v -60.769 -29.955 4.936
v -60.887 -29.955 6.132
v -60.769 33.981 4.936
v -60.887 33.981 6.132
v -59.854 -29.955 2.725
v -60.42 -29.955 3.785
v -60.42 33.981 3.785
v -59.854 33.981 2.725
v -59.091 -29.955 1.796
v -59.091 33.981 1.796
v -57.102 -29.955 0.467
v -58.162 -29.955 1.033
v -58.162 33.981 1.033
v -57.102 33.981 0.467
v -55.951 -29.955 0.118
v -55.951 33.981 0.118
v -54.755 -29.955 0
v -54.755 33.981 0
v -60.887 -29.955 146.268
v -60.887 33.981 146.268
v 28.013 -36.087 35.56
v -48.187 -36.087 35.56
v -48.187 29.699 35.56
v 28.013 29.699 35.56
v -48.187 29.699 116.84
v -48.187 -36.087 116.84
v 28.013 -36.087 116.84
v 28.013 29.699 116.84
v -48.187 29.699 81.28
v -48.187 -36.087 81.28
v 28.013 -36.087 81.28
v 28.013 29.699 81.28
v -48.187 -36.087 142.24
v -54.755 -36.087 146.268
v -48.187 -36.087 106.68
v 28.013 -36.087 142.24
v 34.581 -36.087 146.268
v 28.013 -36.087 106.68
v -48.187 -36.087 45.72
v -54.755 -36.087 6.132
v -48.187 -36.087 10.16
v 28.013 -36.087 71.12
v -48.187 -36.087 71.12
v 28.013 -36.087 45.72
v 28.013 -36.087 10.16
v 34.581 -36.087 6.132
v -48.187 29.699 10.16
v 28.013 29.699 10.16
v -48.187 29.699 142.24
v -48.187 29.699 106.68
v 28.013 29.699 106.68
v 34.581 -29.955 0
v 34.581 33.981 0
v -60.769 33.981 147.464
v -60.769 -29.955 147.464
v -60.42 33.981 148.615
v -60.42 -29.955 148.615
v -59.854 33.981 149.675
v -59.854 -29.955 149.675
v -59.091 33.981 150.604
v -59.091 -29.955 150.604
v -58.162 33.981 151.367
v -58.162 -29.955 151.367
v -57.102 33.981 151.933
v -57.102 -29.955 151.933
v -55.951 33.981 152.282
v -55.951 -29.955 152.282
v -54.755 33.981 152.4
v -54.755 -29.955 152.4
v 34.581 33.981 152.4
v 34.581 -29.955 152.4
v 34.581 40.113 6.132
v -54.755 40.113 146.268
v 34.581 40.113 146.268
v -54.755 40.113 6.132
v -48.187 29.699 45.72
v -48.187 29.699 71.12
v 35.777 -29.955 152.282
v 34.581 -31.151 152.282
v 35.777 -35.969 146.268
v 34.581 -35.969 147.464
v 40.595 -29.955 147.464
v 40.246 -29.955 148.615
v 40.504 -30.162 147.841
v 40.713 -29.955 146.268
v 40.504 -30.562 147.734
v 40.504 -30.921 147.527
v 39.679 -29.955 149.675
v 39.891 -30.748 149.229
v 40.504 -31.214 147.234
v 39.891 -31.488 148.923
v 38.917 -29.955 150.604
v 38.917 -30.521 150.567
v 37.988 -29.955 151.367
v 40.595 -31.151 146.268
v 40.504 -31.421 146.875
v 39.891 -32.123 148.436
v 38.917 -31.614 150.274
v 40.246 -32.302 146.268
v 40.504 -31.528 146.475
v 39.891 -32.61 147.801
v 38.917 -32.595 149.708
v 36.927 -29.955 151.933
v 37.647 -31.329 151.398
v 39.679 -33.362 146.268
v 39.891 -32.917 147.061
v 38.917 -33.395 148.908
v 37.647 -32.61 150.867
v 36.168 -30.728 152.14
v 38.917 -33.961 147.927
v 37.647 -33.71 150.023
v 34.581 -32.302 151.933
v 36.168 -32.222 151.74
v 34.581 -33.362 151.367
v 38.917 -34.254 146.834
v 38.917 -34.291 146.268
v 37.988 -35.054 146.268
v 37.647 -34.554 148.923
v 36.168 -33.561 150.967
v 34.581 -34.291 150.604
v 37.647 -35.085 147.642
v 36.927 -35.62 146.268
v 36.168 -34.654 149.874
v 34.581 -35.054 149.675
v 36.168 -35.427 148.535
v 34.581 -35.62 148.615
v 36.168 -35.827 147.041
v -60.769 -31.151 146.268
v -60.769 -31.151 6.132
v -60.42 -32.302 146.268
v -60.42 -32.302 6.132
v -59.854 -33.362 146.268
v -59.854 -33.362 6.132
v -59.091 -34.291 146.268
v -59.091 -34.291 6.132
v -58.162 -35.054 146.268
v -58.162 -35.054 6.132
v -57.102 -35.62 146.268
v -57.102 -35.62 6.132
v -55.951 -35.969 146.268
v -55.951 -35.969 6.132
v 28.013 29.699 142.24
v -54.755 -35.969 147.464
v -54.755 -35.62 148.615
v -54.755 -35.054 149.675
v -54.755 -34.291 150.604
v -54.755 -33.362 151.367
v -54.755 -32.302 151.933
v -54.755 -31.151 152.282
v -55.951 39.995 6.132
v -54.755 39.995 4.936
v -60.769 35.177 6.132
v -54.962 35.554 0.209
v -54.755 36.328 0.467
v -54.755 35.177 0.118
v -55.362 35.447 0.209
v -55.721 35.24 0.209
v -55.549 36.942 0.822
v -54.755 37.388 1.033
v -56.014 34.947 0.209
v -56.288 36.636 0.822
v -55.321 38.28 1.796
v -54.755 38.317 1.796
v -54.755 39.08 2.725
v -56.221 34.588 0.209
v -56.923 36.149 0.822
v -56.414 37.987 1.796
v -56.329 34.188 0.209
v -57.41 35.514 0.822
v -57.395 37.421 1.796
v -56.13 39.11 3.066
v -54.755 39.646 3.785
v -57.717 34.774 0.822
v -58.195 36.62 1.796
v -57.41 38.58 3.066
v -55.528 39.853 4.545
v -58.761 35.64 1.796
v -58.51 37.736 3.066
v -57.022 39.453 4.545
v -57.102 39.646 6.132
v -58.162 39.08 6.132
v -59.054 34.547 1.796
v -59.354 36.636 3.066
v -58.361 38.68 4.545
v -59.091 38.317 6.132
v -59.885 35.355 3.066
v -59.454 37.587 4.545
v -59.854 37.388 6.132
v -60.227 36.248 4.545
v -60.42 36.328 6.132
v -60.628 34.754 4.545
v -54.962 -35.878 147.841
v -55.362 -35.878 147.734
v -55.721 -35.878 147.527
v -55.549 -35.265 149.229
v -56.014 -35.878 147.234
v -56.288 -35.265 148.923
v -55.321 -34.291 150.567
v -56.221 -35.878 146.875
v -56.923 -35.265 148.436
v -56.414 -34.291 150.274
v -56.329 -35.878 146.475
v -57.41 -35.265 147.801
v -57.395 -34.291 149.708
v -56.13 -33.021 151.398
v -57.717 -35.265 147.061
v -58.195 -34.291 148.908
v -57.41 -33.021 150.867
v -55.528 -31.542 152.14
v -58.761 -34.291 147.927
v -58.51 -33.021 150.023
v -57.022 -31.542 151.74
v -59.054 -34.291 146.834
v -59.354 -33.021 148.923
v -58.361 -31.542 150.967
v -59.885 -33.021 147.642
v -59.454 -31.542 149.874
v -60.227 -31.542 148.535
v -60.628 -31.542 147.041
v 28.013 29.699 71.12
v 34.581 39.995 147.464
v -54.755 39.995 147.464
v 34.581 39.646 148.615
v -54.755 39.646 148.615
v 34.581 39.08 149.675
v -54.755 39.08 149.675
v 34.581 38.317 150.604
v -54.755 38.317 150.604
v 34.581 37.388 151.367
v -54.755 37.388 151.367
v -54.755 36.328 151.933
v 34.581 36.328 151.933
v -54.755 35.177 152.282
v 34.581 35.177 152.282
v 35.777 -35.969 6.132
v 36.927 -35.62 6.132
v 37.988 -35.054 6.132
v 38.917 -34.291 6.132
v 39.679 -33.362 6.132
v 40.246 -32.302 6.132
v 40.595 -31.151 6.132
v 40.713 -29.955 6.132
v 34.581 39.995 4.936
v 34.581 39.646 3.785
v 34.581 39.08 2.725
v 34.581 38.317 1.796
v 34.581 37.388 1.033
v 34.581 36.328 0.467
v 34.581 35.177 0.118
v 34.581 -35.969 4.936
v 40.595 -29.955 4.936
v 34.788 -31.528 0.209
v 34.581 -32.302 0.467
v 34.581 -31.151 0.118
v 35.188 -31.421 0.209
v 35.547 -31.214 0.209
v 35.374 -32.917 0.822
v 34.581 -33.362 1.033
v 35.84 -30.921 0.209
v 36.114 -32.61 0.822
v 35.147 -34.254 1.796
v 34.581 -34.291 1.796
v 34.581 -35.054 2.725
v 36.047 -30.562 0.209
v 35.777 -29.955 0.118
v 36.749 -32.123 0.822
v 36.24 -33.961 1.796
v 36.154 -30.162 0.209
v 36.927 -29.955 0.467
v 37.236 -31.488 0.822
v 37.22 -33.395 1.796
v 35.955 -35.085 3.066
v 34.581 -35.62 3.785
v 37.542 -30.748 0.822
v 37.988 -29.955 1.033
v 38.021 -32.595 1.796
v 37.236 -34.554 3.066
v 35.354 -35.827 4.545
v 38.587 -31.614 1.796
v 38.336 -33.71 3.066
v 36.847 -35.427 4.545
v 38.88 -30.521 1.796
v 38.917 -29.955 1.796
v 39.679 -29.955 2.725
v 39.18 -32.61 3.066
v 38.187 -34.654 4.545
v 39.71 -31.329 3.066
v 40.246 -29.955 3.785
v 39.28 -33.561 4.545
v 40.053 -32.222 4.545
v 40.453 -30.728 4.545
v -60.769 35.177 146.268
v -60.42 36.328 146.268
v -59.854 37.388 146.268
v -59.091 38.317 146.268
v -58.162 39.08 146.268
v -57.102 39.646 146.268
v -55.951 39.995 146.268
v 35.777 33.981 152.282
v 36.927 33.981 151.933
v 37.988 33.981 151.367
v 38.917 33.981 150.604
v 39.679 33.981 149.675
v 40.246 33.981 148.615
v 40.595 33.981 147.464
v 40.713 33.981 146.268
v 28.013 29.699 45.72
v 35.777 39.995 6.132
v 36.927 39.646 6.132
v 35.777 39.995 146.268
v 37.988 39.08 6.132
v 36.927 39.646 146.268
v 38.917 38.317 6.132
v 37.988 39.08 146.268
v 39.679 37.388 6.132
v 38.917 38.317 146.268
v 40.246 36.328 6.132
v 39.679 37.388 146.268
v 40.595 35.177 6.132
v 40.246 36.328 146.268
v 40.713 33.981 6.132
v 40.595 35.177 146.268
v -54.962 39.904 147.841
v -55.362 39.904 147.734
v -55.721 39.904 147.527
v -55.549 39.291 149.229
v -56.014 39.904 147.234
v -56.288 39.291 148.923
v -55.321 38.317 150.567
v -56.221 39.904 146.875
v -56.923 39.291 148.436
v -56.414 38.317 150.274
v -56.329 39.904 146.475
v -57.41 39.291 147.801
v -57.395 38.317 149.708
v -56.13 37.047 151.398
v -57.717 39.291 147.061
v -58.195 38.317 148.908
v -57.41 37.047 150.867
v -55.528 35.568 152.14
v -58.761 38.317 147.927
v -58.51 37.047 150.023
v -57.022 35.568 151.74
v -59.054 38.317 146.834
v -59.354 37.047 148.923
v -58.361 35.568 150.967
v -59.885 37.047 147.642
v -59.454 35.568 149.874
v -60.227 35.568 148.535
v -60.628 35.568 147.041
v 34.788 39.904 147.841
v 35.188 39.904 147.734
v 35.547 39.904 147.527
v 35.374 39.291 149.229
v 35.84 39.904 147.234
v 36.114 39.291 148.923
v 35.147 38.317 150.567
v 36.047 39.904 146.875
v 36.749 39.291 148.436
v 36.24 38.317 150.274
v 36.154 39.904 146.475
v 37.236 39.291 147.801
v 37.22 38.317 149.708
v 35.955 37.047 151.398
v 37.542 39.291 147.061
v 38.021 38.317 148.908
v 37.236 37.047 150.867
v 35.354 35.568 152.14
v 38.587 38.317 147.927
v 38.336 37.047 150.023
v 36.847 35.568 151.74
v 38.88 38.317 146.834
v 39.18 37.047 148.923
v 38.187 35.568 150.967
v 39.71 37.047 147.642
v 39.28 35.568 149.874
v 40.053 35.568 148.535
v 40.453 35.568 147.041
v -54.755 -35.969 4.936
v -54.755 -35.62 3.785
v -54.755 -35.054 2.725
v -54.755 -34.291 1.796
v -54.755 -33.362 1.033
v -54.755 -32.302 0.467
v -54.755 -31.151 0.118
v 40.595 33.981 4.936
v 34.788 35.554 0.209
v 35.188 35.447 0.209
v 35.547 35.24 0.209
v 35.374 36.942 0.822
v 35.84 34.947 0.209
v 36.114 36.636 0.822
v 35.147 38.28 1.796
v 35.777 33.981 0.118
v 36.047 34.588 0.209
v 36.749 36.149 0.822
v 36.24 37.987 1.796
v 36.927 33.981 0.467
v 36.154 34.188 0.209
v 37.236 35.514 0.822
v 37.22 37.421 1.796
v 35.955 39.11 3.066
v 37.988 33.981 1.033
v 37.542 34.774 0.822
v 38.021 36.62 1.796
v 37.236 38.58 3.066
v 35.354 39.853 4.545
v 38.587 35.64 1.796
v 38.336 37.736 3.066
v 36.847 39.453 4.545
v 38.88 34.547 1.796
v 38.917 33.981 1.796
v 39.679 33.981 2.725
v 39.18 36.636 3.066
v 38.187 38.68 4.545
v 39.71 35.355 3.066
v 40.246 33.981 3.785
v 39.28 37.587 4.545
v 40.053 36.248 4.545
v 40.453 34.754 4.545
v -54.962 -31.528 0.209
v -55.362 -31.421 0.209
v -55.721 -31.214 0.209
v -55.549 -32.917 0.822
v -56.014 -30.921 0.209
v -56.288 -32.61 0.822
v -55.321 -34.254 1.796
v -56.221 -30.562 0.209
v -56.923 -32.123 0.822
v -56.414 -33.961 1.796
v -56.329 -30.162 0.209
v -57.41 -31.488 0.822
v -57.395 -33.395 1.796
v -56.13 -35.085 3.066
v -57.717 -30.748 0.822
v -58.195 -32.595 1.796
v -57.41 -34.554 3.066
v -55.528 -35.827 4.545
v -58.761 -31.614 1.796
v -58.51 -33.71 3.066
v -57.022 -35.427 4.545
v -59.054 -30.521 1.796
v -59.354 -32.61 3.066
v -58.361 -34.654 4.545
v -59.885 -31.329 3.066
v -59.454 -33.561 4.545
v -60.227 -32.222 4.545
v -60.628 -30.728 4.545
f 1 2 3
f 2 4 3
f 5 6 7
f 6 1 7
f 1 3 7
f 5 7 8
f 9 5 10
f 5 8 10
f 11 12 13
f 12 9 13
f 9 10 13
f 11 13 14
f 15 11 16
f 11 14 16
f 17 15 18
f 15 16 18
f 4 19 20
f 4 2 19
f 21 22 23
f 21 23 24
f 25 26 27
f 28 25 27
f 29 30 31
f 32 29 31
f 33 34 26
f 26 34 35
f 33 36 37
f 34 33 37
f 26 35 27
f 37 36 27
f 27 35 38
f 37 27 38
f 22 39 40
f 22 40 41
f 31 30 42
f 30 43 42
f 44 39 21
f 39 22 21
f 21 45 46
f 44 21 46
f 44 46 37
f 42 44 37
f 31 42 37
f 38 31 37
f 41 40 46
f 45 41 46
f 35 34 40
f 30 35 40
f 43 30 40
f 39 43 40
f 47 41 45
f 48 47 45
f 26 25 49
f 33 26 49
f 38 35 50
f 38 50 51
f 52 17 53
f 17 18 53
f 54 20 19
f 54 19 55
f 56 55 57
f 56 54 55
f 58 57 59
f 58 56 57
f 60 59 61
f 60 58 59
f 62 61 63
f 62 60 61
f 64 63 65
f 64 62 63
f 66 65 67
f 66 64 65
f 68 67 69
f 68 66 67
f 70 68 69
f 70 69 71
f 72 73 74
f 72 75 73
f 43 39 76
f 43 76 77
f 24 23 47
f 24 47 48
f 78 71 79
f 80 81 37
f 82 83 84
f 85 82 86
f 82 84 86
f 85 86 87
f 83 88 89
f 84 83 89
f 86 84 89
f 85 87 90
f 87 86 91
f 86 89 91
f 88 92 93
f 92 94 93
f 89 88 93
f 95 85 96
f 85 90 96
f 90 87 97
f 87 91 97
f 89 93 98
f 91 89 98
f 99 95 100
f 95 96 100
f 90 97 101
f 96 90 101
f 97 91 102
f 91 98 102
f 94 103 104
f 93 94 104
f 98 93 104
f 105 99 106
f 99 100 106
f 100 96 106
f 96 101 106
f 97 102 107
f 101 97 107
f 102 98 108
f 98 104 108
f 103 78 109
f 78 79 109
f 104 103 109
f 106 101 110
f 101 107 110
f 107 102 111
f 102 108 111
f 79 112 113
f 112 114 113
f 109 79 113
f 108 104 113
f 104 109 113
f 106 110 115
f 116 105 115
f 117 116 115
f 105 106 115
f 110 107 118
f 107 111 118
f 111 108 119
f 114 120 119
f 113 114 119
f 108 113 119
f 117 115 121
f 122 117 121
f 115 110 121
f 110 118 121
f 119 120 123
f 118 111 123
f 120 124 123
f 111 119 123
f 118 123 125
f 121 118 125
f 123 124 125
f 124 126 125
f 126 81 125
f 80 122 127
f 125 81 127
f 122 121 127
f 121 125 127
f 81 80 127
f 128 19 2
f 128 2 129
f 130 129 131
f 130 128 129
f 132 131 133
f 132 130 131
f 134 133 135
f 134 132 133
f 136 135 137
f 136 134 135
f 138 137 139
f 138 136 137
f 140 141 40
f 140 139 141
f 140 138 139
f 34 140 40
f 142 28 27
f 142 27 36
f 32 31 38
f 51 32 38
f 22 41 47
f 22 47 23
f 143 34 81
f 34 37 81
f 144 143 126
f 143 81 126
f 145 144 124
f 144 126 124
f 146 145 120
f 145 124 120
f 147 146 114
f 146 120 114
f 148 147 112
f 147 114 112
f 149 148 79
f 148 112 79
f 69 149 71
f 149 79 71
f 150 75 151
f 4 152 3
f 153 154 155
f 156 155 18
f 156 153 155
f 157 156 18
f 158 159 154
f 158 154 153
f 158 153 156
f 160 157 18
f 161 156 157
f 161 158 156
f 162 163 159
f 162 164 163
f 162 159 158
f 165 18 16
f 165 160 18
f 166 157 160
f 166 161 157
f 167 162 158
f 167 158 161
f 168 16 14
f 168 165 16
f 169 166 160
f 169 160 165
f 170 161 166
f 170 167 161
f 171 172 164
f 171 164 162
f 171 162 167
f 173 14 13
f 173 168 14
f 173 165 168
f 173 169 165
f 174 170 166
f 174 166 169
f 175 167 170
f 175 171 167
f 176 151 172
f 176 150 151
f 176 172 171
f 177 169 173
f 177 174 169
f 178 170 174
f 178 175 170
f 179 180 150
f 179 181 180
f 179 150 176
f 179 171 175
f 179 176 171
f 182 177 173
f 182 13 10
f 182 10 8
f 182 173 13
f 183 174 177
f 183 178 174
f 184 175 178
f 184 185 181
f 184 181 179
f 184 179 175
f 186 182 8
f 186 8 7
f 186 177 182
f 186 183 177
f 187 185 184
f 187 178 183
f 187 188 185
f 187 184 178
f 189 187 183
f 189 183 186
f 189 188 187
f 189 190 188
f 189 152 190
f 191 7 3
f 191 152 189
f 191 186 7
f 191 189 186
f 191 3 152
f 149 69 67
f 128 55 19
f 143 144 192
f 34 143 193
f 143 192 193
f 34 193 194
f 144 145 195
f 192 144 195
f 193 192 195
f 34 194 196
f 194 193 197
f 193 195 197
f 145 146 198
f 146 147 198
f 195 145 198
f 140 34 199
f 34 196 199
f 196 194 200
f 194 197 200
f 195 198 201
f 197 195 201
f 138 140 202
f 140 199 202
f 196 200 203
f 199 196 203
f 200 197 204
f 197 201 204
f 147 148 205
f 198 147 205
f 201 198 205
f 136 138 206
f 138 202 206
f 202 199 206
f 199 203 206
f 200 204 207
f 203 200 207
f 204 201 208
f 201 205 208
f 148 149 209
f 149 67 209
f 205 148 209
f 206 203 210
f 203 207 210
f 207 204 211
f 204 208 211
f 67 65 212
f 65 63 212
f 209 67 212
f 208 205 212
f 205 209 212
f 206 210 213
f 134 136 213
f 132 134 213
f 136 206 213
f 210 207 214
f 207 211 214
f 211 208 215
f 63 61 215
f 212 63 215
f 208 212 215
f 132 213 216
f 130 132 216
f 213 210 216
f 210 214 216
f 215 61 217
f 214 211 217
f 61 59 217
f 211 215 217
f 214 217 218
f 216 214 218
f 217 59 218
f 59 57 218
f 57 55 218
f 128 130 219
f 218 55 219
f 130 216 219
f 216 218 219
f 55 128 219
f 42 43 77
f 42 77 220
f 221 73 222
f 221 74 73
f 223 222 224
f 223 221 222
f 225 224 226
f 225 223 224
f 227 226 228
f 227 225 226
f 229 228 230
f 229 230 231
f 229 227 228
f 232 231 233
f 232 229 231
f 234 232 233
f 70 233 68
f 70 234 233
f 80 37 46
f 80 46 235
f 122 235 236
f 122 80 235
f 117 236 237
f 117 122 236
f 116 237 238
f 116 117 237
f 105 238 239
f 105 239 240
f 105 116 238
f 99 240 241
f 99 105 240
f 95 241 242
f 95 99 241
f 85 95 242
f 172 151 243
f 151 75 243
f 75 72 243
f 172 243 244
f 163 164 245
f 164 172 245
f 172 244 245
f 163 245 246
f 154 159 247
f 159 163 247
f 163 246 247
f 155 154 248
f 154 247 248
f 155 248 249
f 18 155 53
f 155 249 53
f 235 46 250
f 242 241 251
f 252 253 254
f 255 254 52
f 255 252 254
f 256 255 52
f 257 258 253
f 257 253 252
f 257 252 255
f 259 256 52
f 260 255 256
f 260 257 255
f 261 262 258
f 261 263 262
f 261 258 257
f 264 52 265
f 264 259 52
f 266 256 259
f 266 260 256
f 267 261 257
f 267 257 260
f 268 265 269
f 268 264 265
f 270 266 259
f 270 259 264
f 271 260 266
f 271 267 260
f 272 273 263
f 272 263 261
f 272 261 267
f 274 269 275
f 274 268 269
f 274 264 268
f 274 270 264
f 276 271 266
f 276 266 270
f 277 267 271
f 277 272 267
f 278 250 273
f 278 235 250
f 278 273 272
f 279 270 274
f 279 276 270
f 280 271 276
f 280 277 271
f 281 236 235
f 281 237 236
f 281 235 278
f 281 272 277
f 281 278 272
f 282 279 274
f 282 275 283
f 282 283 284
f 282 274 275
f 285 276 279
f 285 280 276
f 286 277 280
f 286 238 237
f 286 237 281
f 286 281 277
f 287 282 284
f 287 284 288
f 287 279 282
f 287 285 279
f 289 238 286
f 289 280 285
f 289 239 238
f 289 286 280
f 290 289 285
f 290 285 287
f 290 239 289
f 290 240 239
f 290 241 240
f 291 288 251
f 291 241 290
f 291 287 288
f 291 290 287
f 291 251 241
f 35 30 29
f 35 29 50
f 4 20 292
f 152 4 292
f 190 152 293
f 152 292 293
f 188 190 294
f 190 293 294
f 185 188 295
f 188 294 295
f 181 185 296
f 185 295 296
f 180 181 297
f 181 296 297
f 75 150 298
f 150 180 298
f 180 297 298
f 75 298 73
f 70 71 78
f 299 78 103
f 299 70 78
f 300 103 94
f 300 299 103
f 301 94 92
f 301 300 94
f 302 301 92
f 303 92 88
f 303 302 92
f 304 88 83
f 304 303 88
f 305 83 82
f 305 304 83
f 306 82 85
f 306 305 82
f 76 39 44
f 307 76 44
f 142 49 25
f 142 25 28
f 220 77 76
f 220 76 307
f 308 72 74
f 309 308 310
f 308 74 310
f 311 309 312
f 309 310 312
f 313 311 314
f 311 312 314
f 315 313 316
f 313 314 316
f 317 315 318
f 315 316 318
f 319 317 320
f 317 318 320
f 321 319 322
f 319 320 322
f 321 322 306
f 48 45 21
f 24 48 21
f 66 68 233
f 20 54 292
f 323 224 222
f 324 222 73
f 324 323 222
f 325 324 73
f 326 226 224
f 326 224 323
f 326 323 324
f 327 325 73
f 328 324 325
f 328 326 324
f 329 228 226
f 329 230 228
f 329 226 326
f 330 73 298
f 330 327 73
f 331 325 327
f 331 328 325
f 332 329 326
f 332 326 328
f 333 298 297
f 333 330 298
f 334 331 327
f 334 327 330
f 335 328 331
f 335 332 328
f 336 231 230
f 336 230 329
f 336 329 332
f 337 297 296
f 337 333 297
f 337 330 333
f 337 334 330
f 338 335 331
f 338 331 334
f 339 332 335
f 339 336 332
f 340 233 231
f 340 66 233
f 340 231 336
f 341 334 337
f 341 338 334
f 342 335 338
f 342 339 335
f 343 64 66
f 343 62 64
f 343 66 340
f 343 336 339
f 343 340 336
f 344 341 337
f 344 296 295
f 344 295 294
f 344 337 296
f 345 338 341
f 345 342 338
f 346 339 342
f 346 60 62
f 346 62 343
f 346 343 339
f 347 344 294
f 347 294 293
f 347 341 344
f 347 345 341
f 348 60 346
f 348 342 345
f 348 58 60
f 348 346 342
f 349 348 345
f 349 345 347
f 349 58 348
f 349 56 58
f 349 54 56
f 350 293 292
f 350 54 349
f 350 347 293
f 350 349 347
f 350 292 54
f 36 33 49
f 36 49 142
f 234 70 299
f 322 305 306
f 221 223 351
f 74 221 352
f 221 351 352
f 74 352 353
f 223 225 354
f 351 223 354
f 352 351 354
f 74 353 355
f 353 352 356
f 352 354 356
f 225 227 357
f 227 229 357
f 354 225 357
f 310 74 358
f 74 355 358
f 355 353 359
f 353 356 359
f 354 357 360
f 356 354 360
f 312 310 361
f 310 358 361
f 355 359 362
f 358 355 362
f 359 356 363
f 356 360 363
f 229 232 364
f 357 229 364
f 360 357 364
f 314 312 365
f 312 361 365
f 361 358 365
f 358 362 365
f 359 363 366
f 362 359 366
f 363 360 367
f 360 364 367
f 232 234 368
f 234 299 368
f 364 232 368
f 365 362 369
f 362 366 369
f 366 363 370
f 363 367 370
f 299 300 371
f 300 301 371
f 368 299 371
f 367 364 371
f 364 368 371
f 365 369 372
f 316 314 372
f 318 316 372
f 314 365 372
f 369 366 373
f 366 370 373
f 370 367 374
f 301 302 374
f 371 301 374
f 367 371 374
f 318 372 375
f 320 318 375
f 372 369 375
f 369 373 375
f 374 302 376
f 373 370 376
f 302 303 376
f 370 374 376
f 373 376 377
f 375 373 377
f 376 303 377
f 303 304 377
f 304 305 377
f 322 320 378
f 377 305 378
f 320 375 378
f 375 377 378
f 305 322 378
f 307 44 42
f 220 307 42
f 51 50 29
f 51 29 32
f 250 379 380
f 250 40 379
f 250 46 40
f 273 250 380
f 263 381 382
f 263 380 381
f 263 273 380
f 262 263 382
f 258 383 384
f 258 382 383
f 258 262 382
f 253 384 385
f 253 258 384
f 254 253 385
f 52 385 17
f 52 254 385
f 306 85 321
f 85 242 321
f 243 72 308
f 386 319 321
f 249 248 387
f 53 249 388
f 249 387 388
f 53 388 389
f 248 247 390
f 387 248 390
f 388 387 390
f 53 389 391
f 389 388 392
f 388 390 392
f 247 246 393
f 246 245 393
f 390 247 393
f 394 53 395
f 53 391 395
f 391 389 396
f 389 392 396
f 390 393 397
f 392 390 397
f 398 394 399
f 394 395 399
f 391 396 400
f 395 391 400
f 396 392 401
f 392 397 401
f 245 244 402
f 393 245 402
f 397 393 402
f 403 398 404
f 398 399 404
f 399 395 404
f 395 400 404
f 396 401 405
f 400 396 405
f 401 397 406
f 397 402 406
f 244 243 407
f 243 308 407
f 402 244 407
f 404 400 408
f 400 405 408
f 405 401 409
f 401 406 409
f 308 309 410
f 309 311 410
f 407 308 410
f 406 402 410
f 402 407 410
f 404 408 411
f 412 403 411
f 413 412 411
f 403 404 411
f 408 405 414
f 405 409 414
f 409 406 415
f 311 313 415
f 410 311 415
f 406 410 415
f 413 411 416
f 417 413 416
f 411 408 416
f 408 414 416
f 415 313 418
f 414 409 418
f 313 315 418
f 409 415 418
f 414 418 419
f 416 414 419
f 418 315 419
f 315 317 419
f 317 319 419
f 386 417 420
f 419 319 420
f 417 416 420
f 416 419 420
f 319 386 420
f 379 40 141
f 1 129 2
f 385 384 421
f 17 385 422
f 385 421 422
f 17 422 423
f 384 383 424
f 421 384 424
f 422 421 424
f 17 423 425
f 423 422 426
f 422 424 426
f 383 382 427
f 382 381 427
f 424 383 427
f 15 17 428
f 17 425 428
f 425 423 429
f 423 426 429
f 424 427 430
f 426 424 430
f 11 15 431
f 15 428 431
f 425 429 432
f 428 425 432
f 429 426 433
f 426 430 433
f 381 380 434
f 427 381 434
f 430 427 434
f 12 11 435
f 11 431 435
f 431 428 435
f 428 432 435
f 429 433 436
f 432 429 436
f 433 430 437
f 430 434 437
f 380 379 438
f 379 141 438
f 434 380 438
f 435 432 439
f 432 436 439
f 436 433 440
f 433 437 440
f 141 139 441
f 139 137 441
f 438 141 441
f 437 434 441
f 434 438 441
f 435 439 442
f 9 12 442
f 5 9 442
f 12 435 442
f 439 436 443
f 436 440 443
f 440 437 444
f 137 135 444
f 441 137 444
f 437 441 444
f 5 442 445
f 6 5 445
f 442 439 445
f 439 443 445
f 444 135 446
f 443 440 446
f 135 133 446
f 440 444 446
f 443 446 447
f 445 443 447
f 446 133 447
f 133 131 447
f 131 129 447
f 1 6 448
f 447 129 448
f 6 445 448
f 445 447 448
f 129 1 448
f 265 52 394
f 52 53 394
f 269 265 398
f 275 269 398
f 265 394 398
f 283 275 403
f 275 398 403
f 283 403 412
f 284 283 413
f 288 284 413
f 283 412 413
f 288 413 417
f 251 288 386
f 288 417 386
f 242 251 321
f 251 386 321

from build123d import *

# Parameters (mm, degrees)
F0_W     = 101.6
F0_H     = 76.2
F1_DEPTH = 152.4
F2_W     = 76.2
F2_H     = 25.4
F3_DEPTH = 65.786
F4_R     = 6.132102


with BuildPart() as f1:
    # F0 (on Top) → F1 (new body)
    with BuildSketch(Plane.XY):
        with Locations((-10.087167, 2.012966)):
            Rectangle(F0_W, F0_H)
    extrude(amount=F1_DEPTH)

    # F2 (on face) → F3 (cut)
    with BuildSketch(Plane.XZ.offset(36.087034)):
        with Locations((-10.087167, 129.54)):
            Rectangle(F2_W, F2_H)
        with Locations((-10.087167, 93.98)):
            Rectangle(F2_W, F2_H)
        with Locations((-10.087167, 58.42)):
            Rectangle(F2_W, F2_H)
        with Locations((-10.087167, 22.86)):
            Rectangle(F2_W, F2_H)
    extrude(amount=-F3_DEPTH, mode=Mode.SUBTRACT)

    # F4
    f4_edges = [f1.edges().sort_by_distance(p)[0] for p in [
        (-60.887167, 2.012966, 152.4),
        (-10.087167, -36.087034, 152.4),
        (40.712833, 2.012966, 152.4),
        (-10.087167, 40.112966, 152.4),
        (40.712833, -36.087034, 76.2),
        (40.712833, 40.112966, 76.2),
        (-60.887167, 40.112966, 76.2),
        (-60.887167, -36.087034, 76.2),
        (-10.087167, -36.087034, 0),
        (-10.087167, 40.112966, 0),
        (40.712833, 2.012966, 0),
        (-60.887167, 2.012966, 0),
    ]]
    fillet(f4_edges, radius=F4_R)


solid = f1.part
